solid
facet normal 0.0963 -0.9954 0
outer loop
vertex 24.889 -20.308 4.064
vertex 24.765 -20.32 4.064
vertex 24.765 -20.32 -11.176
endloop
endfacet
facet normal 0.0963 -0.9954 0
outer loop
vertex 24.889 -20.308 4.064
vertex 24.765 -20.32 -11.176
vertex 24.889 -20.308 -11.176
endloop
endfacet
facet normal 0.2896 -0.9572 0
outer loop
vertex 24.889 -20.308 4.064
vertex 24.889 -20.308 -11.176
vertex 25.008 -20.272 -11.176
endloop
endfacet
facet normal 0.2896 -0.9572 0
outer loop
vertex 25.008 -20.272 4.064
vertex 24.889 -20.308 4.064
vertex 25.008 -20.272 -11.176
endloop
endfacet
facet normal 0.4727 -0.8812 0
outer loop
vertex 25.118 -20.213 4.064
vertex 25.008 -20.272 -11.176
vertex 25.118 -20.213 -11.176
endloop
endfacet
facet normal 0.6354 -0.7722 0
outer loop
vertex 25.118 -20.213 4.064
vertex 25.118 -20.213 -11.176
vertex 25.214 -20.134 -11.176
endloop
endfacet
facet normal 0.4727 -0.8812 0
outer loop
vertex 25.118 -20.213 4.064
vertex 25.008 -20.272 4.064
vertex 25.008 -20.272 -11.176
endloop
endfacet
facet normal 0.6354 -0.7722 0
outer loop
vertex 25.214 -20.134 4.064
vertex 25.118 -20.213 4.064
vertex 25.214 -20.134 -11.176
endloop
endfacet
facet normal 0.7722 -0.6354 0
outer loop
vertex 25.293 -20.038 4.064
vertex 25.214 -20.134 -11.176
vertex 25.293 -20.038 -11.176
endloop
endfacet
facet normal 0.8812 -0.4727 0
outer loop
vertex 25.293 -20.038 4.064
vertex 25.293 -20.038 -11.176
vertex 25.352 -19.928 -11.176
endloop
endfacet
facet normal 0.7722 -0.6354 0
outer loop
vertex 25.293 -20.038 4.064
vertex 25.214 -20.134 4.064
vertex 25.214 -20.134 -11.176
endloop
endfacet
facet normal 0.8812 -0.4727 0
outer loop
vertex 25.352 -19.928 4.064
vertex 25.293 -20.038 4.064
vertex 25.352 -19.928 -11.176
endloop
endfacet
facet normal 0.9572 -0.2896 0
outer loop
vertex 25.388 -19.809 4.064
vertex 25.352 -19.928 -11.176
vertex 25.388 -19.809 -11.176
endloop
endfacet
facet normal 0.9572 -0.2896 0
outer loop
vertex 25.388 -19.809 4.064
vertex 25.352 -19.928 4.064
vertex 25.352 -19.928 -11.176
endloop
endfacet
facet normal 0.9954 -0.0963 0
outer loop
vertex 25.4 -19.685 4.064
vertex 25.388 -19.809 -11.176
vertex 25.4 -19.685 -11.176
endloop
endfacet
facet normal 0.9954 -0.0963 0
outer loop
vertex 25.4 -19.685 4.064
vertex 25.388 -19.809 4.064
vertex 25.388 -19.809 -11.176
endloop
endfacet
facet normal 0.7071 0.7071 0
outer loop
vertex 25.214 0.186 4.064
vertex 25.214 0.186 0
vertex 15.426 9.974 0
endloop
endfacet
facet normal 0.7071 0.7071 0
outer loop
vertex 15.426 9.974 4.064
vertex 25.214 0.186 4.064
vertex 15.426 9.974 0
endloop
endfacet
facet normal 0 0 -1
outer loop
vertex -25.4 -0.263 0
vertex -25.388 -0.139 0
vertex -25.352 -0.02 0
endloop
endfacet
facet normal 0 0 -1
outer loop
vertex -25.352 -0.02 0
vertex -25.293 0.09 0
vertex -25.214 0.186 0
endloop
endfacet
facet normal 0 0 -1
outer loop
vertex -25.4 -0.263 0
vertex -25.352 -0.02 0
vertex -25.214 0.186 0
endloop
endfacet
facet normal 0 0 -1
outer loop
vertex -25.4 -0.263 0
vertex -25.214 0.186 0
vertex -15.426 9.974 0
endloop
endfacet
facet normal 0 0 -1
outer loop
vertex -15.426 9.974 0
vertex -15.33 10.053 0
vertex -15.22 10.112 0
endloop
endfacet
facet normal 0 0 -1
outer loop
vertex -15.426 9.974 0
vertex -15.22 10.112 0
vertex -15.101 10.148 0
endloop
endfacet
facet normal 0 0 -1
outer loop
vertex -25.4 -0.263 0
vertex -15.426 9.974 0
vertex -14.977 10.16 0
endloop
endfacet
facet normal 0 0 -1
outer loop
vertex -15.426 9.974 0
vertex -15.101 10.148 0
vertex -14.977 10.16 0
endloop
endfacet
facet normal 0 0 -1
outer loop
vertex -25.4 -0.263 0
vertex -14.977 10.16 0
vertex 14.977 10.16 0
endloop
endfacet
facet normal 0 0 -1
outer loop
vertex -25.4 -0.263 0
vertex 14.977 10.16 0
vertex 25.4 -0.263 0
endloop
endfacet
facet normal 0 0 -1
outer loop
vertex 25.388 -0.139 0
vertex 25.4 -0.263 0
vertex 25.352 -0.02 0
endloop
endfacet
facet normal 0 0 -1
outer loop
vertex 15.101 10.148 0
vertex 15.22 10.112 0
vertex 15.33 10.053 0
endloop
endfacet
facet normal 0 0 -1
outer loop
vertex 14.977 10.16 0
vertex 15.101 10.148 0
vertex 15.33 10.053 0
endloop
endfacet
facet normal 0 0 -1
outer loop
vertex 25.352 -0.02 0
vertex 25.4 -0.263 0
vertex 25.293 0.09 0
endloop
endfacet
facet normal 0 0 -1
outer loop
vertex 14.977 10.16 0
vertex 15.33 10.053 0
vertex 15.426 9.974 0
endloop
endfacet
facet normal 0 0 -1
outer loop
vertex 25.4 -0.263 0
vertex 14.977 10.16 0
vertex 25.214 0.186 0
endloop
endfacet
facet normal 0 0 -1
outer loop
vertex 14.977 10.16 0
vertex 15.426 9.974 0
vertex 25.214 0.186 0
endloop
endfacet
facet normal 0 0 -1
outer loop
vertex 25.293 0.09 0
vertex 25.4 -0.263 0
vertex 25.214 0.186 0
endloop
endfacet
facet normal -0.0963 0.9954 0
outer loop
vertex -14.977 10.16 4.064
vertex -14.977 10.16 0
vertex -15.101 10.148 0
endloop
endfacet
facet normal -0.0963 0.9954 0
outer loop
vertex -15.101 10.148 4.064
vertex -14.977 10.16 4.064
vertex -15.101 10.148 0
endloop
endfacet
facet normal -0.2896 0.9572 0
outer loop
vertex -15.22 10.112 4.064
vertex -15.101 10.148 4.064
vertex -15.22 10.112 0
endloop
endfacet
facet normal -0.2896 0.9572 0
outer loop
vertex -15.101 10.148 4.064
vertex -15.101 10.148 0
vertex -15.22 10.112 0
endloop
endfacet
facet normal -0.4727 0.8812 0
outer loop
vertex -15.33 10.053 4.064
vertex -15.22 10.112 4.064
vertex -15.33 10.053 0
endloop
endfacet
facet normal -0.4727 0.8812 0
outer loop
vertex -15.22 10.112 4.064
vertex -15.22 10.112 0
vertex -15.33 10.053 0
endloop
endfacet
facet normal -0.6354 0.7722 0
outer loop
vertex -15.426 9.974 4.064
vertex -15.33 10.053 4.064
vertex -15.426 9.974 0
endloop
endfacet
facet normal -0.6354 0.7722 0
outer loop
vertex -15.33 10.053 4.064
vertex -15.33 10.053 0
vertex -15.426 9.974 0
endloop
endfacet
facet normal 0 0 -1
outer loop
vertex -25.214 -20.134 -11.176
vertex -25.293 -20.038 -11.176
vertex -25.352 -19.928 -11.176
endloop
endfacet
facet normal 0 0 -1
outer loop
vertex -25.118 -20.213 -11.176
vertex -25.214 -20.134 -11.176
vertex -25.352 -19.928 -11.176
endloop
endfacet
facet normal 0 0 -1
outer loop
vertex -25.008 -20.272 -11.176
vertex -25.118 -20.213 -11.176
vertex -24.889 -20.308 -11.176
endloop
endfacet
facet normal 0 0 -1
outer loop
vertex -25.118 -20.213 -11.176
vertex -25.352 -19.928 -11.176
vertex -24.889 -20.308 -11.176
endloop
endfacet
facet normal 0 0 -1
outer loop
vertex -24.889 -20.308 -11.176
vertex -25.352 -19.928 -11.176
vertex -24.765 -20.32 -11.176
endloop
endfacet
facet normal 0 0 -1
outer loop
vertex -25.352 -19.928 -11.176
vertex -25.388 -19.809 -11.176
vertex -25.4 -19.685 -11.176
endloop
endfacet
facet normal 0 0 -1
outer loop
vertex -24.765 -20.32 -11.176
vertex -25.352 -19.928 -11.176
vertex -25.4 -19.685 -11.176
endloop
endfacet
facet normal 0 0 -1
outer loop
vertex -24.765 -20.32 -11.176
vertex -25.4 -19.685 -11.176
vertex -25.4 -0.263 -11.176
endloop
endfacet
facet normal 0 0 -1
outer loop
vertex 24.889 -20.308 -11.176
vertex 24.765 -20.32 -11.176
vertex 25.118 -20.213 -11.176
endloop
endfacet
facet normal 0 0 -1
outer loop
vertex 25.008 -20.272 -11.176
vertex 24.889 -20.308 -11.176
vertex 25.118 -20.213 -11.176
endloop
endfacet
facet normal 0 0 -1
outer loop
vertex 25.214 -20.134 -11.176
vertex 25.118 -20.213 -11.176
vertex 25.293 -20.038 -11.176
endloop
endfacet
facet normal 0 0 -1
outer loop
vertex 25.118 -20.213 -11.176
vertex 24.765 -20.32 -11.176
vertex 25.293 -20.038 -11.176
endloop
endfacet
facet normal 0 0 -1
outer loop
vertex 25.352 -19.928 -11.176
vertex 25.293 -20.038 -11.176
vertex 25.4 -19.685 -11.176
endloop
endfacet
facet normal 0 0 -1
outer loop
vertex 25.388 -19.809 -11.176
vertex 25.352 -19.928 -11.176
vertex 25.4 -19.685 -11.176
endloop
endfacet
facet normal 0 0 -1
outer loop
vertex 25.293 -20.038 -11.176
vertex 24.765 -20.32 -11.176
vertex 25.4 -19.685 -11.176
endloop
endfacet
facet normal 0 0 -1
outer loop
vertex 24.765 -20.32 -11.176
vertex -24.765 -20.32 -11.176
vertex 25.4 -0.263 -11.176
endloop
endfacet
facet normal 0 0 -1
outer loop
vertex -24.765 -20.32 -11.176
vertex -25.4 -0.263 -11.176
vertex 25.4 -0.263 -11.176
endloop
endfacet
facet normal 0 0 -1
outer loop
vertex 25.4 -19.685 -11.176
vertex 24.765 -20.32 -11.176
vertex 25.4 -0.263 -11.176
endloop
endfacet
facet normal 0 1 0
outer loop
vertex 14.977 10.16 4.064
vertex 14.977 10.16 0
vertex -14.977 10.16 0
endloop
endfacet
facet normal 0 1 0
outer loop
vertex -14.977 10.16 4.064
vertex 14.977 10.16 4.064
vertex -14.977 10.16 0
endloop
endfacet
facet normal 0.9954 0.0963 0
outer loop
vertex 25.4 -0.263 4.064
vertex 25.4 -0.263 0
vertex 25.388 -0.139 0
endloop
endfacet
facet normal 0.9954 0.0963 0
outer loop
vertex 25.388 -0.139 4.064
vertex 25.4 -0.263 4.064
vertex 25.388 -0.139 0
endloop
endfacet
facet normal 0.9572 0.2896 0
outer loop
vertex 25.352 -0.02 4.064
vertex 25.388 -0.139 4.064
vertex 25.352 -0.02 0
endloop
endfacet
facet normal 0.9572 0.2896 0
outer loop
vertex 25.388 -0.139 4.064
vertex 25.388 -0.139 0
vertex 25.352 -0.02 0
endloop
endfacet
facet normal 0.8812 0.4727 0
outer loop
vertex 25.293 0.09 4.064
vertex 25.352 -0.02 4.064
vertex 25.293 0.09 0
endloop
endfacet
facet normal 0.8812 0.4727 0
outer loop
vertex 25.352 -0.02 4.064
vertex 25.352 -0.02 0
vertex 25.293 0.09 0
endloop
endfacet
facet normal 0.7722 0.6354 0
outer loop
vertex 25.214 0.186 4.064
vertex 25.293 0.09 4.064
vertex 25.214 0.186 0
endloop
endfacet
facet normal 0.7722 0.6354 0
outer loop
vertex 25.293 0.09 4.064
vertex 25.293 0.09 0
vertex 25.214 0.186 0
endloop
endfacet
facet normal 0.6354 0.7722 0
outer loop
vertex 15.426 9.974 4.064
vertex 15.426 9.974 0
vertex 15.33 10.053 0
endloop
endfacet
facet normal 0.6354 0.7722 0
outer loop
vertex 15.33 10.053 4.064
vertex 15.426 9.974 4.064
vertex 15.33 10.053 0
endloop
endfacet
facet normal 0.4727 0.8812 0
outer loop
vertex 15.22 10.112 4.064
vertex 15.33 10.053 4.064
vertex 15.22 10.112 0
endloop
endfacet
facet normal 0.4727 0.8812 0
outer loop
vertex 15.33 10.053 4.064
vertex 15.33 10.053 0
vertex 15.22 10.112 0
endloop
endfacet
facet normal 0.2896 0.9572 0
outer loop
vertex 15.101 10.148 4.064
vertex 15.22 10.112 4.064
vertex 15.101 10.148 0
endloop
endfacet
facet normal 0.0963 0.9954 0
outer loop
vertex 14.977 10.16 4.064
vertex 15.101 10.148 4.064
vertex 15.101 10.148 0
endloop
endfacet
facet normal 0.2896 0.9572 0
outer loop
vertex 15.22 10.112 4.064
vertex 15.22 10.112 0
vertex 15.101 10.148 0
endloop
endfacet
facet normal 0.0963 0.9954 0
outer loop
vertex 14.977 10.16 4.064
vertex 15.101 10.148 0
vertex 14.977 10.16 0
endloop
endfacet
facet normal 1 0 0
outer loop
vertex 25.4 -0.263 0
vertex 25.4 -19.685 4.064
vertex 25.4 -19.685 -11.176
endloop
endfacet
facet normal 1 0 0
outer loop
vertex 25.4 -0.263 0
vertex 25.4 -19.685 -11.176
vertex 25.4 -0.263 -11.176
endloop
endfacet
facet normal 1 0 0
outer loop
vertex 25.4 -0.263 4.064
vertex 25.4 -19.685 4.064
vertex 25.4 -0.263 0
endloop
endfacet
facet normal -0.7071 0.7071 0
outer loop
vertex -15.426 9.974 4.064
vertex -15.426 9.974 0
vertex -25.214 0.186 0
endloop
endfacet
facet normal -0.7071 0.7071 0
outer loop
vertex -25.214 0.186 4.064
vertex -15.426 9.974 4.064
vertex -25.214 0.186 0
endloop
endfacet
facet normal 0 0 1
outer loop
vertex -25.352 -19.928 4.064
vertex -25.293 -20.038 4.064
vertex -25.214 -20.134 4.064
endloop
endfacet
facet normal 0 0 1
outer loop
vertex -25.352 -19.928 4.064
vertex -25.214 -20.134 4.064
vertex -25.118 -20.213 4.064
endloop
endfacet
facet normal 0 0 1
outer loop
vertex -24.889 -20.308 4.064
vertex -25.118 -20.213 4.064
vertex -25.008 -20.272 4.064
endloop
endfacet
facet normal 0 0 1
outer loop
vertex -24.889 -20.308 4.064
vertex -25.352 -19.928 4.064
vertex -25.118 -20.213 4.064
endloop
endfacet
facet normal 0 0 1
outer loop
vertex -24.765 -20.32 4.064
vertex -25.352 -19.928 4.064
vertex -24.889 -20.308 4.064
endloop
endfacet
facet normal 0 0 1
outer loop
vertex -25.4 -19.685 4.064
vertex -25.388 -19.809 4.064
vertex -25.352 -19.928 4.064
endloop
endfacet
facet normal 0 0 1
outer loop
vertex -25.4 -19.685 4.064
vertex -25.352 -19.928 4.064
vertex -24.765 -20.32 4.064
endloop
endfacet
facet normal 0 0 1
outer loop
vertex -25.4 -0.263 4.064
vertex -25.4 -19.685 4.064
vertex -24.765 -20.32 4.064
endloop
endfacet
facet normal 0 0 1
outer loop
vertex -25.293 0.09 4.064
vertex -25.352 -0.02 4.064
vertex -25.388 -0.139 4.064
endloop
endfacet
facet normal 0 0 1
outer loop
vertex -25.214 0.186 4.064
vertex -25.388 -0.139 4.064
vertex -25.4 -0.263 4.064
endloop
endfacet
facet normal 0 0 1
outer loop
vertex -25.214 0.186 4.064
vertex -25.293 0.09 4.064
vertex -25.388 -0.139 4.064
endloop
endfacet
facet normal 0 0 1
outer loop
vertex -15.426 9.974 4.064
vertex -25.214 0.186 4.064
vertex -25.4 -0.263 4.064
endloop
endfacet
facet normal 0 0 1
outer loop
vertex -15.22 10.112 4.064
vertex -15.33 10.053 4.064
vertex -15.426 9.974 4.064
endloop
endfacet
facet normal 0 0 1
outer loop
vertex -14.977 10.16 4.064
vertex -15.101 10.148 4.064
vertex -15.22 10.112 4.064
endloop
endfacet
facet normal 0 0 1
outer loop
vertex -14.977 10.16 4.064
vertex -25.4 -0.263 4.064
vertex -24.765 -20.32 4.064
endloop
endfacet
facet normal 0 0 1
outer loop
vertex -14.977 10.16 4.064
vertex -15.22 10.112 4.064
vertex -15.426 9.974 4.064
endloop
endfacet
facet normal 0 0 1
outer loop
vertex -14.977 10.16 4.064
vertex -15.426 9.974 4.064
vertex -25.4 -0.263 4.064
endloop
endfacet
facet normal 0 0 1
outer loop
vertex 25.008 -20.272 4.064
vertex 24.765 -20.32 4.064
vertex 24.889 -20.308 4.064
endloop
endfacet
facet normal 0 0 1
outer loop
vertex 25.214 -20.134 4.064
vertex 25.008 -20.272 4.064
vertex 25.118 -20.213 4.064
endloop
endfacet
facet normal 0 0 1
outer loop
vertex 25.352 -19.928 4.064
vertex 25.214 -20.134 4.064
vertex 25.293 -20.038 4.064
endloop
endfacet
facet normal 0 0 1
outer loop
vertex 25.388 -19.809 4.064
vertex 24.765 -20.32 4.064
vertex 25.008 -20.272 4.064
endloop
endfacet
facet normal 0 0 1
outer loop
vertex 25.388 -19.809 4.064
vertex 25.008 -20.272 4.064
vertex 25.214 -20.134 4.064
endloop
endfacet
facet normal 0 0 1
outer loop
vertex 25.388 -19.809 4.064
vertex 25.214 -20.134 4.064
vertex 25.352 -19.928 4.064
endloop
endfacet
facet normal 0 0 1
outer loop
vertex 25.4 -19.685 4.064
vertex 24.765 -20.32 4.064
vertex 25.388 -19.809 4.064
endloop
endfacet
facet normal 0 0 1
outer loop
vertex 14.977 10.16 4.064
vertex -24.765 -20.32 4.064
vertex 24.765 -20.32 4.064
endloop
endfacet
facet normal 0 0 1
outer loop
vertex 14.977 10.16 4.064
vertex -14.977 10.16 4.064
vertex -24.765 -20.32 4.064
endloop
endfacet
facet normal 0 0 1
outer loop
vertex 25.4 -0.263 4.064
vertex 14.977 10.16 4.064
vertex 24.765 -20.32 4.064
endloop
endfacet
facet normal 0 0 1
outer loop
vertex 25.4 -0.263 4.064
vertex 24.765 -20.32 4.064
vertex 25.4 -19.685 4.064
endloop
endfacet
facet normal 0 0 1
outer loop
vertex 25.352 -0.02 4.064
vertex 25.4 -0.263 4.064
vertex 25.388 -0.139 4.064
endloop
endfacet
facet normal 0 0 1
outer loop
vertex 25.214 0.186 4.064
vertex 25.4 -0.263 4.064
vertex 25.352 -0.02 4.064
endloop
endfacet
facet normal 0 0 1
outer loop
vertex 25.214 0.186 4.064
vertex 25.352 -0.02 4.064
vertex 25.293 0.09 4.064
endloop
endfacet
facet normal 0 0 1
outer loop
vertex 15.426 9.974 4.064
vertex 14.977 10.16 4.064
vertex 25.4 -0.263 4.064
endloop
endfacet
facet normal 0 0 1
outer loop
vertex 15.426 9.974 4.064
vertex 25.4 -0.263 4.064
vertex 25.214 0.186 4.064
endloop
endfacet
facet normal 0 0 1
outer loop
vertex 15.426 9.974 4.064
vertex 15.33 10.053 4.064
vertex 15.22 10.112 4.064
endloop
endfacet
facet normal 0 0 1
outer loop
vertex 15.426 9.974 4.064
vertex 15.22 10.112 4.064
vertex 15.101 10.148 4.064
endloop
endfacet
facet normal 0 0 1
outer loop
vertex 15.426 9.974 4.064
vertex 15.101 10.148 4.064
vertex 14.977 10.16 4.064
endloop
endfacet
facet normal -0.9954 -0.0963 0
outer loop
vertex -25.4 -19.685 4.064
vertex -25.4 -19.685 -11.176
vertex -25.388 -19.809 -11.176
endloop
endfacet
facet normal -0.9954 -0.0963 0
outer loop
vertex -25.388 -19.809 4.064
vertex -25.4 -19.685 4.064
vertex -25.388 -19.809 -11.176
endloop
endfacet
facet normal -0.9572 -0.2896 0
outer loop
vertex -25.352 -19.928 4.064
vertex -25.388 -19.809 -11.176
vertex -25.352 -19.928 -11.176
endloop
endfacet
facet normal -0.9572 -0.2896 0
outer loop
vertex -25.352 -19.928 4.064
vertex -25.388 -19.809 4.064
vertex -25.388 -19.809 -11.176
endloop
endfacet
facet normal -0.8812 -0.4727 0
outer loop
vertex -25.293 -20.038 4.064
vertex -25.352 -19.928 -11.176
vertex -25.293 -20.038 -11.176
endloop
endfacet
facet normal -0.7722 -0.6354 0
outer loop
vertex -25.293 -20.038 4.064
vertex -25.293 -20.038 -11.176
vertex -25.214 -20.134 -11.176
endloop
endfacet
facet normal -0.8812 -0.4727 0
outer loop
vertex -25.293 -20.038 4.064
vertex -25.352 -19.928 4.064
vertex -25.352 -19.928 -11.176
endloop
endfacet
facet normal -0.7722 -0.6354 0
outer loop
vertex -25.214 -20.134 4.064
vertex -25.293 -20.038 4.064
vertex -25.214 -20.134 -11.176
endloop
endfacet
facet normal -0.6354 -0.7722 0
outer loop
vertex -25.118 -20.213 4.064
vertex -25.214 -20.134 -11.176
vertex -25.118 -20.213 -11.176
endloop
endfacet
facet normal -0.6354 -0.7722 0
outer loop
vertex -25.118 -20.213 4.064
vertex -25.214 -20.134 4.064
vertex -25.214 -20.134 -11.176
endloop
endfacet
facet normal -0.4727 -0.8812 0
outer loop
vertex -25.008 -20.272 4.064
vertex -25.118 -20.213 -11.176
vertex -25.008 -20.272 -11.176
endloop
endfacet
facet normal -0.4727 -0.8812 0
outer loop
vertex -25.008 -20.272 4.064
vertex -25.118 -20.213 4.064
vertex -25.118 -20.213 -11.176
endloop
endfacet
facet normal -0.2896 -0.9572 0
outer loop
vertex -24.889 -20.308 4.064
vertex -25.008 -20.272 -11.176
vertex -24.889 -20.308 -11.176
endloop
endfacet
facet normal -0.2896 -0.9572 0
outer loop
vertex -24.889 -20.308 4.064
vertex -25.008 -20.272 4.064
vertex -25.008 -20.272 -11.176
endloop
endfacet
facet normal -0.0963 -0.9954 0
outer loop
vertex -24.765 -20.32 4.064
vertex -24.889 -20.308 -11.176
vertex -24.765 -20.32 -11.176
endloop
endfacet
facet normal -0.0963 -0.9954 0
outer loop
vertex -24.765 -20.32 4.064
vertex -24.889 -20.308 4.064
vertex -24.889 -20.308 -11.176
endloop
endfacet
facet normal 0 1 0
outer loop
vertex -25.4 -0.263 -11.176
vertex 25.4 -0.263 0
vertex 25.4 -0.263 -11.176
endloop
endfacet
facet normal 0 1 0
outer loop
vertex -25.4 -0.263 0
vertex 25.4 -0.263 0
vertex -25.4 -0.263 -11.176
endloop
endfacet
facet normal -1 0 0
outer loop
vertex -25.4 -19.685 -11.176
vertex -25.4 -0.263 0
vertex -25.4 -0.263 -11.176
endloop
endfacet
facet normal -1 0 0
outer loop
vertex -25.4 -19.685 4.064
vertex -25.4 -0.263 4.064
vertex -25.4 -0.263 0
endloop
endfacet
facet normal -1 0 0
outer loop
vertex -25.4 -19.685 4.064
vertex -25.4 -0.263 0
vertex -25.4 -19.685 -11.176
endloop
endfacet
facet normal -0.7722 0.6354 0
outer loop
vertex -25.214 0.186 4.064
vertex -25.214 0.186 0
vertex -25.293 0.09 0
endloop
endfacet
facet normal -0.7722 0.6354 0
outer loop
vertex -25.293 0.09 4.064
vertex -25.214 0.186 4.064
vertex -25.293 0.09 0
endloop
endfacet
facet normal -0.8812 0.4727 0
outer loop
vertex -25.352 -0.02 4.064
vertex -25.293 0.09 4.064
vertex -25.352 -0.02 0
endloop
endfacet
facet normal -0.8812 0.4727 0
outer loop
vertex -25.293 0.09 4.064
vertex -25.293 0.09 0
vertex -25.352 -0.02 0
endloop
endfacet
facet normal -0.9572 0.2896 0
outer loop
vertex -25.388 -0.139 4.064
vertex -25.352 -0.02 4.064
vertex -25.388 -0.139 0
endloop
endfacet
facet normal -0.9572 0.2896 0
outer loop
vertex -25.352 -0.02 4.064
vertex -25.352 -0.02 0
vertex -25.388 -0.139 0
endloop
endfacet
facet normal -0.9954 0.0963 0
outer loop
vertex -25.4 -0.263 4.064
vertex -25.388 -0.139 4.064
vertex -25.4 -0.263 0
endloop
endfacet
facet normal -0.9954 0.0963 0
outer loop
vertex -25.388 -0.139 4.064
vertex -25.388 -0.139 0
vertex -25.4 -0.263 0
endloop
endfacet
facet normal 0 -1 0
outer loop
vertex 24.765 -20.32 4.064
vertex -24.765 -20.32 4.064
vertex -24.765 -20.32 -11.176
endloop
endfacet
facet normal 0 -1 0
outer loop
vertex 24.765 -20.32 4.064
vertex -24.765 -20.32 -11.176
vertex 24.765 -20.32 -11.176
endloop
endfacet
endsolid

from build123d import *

# Parameters (mm, degrees)
F1_DEPTH = 4.064
F3_DEPTH = 15.24
F4_DEPTH = 15.24


with BuildPart() as f1:
    # F0 (on Top) → F1 (new body)
    with BuildSketch(Plane.XY):
        with BuildLine():
            Line((14.976974, 10.16), (-14.976974, 10.16))
            ThreePointArc((-14.976974, 10.16), (-15.219978, 10.111664), (-15.425987, 9.974013))
            Line((-15.425987, 9.974013), (-25.214013, 0.185987))
            ThreePointArc((-25.214013, 0.185987), (-25.351664, -0.020022), (-25.4, -0.263026))
            Line((-25.4, -0.263026), (-25.4, -1.251))
            Line((-25.4, -1.251), (-25.4, -19.685))
            ThreePointArc((-25.4, -19.685), (-25.214013, -20.134013), (-24.765, -20.32))
            Line((-24.765, -20.32), (24.765, -20.32))
            ThreePointArc((24.765, -20.32), (25.214013, -20.134013), (25.4, -19.685))
            Line((25.4, -19.685), (25.4, -0.263026))
            ThreePointArc((25.4, -0.263026), (25.351664, -0.020022), (25.214013, 0.185987))
            Line((25.214013, 0.185987), (15.425987, 9.974013))
            ThreePointArc((15.425987, 9.974013), (15.219978, 10.111664), (14.976974, 10.16))
        make_face()
    extrude(amount=F1_DEPTH)

    # F2 (on face) → F3 (join)
    with BuildSketch(Plane.XY.offset(4.064)):
        with BuildLine():
            Line((-25.4, -0.263026), (-25.4, -19.685))
            ThreePointArc((-25.4, -19.685), (-25.214013, -20.134013), (-24.765, -20.32))
            Line((-24.765, -20.32), (24.765, -20.32))
            ThreePointArc((24.765, -20.32), (25.214013, -20.134013), (25.4, -19.685))
            Line((25.4, -19.685), (25.4, -0.263026))
            Line((25.4, -0.263026), (-25.4, -0.263026))
        make_face()
    extrude(amount=-F3_DEPTH)

    # F2 (on face) → F4 (join)
    with BuildSketch(Plane.XY.offset(4.064)):
        with BuildLine():
            Line((-25.4, -0.263026), (-25.4, -19.685))
            ThreePointArc((-25.4, -19.685), (-25.214013, -20.134013), (-24.765, -20.32))
            Line((-24.765, -20.32), (24.765, -20.32))
            ThreePointArc((24.765, -20.32), (25.214013, -20.134013), (25.4, -19.685))
            Line((25.4, -19.685), (25.4, -0.263026))
            Line((25.4, -0.263026), (-25.4, -0.263026))
        make_face()
    extrude(amount=-F4_DEPTH)


solid = f1.part
